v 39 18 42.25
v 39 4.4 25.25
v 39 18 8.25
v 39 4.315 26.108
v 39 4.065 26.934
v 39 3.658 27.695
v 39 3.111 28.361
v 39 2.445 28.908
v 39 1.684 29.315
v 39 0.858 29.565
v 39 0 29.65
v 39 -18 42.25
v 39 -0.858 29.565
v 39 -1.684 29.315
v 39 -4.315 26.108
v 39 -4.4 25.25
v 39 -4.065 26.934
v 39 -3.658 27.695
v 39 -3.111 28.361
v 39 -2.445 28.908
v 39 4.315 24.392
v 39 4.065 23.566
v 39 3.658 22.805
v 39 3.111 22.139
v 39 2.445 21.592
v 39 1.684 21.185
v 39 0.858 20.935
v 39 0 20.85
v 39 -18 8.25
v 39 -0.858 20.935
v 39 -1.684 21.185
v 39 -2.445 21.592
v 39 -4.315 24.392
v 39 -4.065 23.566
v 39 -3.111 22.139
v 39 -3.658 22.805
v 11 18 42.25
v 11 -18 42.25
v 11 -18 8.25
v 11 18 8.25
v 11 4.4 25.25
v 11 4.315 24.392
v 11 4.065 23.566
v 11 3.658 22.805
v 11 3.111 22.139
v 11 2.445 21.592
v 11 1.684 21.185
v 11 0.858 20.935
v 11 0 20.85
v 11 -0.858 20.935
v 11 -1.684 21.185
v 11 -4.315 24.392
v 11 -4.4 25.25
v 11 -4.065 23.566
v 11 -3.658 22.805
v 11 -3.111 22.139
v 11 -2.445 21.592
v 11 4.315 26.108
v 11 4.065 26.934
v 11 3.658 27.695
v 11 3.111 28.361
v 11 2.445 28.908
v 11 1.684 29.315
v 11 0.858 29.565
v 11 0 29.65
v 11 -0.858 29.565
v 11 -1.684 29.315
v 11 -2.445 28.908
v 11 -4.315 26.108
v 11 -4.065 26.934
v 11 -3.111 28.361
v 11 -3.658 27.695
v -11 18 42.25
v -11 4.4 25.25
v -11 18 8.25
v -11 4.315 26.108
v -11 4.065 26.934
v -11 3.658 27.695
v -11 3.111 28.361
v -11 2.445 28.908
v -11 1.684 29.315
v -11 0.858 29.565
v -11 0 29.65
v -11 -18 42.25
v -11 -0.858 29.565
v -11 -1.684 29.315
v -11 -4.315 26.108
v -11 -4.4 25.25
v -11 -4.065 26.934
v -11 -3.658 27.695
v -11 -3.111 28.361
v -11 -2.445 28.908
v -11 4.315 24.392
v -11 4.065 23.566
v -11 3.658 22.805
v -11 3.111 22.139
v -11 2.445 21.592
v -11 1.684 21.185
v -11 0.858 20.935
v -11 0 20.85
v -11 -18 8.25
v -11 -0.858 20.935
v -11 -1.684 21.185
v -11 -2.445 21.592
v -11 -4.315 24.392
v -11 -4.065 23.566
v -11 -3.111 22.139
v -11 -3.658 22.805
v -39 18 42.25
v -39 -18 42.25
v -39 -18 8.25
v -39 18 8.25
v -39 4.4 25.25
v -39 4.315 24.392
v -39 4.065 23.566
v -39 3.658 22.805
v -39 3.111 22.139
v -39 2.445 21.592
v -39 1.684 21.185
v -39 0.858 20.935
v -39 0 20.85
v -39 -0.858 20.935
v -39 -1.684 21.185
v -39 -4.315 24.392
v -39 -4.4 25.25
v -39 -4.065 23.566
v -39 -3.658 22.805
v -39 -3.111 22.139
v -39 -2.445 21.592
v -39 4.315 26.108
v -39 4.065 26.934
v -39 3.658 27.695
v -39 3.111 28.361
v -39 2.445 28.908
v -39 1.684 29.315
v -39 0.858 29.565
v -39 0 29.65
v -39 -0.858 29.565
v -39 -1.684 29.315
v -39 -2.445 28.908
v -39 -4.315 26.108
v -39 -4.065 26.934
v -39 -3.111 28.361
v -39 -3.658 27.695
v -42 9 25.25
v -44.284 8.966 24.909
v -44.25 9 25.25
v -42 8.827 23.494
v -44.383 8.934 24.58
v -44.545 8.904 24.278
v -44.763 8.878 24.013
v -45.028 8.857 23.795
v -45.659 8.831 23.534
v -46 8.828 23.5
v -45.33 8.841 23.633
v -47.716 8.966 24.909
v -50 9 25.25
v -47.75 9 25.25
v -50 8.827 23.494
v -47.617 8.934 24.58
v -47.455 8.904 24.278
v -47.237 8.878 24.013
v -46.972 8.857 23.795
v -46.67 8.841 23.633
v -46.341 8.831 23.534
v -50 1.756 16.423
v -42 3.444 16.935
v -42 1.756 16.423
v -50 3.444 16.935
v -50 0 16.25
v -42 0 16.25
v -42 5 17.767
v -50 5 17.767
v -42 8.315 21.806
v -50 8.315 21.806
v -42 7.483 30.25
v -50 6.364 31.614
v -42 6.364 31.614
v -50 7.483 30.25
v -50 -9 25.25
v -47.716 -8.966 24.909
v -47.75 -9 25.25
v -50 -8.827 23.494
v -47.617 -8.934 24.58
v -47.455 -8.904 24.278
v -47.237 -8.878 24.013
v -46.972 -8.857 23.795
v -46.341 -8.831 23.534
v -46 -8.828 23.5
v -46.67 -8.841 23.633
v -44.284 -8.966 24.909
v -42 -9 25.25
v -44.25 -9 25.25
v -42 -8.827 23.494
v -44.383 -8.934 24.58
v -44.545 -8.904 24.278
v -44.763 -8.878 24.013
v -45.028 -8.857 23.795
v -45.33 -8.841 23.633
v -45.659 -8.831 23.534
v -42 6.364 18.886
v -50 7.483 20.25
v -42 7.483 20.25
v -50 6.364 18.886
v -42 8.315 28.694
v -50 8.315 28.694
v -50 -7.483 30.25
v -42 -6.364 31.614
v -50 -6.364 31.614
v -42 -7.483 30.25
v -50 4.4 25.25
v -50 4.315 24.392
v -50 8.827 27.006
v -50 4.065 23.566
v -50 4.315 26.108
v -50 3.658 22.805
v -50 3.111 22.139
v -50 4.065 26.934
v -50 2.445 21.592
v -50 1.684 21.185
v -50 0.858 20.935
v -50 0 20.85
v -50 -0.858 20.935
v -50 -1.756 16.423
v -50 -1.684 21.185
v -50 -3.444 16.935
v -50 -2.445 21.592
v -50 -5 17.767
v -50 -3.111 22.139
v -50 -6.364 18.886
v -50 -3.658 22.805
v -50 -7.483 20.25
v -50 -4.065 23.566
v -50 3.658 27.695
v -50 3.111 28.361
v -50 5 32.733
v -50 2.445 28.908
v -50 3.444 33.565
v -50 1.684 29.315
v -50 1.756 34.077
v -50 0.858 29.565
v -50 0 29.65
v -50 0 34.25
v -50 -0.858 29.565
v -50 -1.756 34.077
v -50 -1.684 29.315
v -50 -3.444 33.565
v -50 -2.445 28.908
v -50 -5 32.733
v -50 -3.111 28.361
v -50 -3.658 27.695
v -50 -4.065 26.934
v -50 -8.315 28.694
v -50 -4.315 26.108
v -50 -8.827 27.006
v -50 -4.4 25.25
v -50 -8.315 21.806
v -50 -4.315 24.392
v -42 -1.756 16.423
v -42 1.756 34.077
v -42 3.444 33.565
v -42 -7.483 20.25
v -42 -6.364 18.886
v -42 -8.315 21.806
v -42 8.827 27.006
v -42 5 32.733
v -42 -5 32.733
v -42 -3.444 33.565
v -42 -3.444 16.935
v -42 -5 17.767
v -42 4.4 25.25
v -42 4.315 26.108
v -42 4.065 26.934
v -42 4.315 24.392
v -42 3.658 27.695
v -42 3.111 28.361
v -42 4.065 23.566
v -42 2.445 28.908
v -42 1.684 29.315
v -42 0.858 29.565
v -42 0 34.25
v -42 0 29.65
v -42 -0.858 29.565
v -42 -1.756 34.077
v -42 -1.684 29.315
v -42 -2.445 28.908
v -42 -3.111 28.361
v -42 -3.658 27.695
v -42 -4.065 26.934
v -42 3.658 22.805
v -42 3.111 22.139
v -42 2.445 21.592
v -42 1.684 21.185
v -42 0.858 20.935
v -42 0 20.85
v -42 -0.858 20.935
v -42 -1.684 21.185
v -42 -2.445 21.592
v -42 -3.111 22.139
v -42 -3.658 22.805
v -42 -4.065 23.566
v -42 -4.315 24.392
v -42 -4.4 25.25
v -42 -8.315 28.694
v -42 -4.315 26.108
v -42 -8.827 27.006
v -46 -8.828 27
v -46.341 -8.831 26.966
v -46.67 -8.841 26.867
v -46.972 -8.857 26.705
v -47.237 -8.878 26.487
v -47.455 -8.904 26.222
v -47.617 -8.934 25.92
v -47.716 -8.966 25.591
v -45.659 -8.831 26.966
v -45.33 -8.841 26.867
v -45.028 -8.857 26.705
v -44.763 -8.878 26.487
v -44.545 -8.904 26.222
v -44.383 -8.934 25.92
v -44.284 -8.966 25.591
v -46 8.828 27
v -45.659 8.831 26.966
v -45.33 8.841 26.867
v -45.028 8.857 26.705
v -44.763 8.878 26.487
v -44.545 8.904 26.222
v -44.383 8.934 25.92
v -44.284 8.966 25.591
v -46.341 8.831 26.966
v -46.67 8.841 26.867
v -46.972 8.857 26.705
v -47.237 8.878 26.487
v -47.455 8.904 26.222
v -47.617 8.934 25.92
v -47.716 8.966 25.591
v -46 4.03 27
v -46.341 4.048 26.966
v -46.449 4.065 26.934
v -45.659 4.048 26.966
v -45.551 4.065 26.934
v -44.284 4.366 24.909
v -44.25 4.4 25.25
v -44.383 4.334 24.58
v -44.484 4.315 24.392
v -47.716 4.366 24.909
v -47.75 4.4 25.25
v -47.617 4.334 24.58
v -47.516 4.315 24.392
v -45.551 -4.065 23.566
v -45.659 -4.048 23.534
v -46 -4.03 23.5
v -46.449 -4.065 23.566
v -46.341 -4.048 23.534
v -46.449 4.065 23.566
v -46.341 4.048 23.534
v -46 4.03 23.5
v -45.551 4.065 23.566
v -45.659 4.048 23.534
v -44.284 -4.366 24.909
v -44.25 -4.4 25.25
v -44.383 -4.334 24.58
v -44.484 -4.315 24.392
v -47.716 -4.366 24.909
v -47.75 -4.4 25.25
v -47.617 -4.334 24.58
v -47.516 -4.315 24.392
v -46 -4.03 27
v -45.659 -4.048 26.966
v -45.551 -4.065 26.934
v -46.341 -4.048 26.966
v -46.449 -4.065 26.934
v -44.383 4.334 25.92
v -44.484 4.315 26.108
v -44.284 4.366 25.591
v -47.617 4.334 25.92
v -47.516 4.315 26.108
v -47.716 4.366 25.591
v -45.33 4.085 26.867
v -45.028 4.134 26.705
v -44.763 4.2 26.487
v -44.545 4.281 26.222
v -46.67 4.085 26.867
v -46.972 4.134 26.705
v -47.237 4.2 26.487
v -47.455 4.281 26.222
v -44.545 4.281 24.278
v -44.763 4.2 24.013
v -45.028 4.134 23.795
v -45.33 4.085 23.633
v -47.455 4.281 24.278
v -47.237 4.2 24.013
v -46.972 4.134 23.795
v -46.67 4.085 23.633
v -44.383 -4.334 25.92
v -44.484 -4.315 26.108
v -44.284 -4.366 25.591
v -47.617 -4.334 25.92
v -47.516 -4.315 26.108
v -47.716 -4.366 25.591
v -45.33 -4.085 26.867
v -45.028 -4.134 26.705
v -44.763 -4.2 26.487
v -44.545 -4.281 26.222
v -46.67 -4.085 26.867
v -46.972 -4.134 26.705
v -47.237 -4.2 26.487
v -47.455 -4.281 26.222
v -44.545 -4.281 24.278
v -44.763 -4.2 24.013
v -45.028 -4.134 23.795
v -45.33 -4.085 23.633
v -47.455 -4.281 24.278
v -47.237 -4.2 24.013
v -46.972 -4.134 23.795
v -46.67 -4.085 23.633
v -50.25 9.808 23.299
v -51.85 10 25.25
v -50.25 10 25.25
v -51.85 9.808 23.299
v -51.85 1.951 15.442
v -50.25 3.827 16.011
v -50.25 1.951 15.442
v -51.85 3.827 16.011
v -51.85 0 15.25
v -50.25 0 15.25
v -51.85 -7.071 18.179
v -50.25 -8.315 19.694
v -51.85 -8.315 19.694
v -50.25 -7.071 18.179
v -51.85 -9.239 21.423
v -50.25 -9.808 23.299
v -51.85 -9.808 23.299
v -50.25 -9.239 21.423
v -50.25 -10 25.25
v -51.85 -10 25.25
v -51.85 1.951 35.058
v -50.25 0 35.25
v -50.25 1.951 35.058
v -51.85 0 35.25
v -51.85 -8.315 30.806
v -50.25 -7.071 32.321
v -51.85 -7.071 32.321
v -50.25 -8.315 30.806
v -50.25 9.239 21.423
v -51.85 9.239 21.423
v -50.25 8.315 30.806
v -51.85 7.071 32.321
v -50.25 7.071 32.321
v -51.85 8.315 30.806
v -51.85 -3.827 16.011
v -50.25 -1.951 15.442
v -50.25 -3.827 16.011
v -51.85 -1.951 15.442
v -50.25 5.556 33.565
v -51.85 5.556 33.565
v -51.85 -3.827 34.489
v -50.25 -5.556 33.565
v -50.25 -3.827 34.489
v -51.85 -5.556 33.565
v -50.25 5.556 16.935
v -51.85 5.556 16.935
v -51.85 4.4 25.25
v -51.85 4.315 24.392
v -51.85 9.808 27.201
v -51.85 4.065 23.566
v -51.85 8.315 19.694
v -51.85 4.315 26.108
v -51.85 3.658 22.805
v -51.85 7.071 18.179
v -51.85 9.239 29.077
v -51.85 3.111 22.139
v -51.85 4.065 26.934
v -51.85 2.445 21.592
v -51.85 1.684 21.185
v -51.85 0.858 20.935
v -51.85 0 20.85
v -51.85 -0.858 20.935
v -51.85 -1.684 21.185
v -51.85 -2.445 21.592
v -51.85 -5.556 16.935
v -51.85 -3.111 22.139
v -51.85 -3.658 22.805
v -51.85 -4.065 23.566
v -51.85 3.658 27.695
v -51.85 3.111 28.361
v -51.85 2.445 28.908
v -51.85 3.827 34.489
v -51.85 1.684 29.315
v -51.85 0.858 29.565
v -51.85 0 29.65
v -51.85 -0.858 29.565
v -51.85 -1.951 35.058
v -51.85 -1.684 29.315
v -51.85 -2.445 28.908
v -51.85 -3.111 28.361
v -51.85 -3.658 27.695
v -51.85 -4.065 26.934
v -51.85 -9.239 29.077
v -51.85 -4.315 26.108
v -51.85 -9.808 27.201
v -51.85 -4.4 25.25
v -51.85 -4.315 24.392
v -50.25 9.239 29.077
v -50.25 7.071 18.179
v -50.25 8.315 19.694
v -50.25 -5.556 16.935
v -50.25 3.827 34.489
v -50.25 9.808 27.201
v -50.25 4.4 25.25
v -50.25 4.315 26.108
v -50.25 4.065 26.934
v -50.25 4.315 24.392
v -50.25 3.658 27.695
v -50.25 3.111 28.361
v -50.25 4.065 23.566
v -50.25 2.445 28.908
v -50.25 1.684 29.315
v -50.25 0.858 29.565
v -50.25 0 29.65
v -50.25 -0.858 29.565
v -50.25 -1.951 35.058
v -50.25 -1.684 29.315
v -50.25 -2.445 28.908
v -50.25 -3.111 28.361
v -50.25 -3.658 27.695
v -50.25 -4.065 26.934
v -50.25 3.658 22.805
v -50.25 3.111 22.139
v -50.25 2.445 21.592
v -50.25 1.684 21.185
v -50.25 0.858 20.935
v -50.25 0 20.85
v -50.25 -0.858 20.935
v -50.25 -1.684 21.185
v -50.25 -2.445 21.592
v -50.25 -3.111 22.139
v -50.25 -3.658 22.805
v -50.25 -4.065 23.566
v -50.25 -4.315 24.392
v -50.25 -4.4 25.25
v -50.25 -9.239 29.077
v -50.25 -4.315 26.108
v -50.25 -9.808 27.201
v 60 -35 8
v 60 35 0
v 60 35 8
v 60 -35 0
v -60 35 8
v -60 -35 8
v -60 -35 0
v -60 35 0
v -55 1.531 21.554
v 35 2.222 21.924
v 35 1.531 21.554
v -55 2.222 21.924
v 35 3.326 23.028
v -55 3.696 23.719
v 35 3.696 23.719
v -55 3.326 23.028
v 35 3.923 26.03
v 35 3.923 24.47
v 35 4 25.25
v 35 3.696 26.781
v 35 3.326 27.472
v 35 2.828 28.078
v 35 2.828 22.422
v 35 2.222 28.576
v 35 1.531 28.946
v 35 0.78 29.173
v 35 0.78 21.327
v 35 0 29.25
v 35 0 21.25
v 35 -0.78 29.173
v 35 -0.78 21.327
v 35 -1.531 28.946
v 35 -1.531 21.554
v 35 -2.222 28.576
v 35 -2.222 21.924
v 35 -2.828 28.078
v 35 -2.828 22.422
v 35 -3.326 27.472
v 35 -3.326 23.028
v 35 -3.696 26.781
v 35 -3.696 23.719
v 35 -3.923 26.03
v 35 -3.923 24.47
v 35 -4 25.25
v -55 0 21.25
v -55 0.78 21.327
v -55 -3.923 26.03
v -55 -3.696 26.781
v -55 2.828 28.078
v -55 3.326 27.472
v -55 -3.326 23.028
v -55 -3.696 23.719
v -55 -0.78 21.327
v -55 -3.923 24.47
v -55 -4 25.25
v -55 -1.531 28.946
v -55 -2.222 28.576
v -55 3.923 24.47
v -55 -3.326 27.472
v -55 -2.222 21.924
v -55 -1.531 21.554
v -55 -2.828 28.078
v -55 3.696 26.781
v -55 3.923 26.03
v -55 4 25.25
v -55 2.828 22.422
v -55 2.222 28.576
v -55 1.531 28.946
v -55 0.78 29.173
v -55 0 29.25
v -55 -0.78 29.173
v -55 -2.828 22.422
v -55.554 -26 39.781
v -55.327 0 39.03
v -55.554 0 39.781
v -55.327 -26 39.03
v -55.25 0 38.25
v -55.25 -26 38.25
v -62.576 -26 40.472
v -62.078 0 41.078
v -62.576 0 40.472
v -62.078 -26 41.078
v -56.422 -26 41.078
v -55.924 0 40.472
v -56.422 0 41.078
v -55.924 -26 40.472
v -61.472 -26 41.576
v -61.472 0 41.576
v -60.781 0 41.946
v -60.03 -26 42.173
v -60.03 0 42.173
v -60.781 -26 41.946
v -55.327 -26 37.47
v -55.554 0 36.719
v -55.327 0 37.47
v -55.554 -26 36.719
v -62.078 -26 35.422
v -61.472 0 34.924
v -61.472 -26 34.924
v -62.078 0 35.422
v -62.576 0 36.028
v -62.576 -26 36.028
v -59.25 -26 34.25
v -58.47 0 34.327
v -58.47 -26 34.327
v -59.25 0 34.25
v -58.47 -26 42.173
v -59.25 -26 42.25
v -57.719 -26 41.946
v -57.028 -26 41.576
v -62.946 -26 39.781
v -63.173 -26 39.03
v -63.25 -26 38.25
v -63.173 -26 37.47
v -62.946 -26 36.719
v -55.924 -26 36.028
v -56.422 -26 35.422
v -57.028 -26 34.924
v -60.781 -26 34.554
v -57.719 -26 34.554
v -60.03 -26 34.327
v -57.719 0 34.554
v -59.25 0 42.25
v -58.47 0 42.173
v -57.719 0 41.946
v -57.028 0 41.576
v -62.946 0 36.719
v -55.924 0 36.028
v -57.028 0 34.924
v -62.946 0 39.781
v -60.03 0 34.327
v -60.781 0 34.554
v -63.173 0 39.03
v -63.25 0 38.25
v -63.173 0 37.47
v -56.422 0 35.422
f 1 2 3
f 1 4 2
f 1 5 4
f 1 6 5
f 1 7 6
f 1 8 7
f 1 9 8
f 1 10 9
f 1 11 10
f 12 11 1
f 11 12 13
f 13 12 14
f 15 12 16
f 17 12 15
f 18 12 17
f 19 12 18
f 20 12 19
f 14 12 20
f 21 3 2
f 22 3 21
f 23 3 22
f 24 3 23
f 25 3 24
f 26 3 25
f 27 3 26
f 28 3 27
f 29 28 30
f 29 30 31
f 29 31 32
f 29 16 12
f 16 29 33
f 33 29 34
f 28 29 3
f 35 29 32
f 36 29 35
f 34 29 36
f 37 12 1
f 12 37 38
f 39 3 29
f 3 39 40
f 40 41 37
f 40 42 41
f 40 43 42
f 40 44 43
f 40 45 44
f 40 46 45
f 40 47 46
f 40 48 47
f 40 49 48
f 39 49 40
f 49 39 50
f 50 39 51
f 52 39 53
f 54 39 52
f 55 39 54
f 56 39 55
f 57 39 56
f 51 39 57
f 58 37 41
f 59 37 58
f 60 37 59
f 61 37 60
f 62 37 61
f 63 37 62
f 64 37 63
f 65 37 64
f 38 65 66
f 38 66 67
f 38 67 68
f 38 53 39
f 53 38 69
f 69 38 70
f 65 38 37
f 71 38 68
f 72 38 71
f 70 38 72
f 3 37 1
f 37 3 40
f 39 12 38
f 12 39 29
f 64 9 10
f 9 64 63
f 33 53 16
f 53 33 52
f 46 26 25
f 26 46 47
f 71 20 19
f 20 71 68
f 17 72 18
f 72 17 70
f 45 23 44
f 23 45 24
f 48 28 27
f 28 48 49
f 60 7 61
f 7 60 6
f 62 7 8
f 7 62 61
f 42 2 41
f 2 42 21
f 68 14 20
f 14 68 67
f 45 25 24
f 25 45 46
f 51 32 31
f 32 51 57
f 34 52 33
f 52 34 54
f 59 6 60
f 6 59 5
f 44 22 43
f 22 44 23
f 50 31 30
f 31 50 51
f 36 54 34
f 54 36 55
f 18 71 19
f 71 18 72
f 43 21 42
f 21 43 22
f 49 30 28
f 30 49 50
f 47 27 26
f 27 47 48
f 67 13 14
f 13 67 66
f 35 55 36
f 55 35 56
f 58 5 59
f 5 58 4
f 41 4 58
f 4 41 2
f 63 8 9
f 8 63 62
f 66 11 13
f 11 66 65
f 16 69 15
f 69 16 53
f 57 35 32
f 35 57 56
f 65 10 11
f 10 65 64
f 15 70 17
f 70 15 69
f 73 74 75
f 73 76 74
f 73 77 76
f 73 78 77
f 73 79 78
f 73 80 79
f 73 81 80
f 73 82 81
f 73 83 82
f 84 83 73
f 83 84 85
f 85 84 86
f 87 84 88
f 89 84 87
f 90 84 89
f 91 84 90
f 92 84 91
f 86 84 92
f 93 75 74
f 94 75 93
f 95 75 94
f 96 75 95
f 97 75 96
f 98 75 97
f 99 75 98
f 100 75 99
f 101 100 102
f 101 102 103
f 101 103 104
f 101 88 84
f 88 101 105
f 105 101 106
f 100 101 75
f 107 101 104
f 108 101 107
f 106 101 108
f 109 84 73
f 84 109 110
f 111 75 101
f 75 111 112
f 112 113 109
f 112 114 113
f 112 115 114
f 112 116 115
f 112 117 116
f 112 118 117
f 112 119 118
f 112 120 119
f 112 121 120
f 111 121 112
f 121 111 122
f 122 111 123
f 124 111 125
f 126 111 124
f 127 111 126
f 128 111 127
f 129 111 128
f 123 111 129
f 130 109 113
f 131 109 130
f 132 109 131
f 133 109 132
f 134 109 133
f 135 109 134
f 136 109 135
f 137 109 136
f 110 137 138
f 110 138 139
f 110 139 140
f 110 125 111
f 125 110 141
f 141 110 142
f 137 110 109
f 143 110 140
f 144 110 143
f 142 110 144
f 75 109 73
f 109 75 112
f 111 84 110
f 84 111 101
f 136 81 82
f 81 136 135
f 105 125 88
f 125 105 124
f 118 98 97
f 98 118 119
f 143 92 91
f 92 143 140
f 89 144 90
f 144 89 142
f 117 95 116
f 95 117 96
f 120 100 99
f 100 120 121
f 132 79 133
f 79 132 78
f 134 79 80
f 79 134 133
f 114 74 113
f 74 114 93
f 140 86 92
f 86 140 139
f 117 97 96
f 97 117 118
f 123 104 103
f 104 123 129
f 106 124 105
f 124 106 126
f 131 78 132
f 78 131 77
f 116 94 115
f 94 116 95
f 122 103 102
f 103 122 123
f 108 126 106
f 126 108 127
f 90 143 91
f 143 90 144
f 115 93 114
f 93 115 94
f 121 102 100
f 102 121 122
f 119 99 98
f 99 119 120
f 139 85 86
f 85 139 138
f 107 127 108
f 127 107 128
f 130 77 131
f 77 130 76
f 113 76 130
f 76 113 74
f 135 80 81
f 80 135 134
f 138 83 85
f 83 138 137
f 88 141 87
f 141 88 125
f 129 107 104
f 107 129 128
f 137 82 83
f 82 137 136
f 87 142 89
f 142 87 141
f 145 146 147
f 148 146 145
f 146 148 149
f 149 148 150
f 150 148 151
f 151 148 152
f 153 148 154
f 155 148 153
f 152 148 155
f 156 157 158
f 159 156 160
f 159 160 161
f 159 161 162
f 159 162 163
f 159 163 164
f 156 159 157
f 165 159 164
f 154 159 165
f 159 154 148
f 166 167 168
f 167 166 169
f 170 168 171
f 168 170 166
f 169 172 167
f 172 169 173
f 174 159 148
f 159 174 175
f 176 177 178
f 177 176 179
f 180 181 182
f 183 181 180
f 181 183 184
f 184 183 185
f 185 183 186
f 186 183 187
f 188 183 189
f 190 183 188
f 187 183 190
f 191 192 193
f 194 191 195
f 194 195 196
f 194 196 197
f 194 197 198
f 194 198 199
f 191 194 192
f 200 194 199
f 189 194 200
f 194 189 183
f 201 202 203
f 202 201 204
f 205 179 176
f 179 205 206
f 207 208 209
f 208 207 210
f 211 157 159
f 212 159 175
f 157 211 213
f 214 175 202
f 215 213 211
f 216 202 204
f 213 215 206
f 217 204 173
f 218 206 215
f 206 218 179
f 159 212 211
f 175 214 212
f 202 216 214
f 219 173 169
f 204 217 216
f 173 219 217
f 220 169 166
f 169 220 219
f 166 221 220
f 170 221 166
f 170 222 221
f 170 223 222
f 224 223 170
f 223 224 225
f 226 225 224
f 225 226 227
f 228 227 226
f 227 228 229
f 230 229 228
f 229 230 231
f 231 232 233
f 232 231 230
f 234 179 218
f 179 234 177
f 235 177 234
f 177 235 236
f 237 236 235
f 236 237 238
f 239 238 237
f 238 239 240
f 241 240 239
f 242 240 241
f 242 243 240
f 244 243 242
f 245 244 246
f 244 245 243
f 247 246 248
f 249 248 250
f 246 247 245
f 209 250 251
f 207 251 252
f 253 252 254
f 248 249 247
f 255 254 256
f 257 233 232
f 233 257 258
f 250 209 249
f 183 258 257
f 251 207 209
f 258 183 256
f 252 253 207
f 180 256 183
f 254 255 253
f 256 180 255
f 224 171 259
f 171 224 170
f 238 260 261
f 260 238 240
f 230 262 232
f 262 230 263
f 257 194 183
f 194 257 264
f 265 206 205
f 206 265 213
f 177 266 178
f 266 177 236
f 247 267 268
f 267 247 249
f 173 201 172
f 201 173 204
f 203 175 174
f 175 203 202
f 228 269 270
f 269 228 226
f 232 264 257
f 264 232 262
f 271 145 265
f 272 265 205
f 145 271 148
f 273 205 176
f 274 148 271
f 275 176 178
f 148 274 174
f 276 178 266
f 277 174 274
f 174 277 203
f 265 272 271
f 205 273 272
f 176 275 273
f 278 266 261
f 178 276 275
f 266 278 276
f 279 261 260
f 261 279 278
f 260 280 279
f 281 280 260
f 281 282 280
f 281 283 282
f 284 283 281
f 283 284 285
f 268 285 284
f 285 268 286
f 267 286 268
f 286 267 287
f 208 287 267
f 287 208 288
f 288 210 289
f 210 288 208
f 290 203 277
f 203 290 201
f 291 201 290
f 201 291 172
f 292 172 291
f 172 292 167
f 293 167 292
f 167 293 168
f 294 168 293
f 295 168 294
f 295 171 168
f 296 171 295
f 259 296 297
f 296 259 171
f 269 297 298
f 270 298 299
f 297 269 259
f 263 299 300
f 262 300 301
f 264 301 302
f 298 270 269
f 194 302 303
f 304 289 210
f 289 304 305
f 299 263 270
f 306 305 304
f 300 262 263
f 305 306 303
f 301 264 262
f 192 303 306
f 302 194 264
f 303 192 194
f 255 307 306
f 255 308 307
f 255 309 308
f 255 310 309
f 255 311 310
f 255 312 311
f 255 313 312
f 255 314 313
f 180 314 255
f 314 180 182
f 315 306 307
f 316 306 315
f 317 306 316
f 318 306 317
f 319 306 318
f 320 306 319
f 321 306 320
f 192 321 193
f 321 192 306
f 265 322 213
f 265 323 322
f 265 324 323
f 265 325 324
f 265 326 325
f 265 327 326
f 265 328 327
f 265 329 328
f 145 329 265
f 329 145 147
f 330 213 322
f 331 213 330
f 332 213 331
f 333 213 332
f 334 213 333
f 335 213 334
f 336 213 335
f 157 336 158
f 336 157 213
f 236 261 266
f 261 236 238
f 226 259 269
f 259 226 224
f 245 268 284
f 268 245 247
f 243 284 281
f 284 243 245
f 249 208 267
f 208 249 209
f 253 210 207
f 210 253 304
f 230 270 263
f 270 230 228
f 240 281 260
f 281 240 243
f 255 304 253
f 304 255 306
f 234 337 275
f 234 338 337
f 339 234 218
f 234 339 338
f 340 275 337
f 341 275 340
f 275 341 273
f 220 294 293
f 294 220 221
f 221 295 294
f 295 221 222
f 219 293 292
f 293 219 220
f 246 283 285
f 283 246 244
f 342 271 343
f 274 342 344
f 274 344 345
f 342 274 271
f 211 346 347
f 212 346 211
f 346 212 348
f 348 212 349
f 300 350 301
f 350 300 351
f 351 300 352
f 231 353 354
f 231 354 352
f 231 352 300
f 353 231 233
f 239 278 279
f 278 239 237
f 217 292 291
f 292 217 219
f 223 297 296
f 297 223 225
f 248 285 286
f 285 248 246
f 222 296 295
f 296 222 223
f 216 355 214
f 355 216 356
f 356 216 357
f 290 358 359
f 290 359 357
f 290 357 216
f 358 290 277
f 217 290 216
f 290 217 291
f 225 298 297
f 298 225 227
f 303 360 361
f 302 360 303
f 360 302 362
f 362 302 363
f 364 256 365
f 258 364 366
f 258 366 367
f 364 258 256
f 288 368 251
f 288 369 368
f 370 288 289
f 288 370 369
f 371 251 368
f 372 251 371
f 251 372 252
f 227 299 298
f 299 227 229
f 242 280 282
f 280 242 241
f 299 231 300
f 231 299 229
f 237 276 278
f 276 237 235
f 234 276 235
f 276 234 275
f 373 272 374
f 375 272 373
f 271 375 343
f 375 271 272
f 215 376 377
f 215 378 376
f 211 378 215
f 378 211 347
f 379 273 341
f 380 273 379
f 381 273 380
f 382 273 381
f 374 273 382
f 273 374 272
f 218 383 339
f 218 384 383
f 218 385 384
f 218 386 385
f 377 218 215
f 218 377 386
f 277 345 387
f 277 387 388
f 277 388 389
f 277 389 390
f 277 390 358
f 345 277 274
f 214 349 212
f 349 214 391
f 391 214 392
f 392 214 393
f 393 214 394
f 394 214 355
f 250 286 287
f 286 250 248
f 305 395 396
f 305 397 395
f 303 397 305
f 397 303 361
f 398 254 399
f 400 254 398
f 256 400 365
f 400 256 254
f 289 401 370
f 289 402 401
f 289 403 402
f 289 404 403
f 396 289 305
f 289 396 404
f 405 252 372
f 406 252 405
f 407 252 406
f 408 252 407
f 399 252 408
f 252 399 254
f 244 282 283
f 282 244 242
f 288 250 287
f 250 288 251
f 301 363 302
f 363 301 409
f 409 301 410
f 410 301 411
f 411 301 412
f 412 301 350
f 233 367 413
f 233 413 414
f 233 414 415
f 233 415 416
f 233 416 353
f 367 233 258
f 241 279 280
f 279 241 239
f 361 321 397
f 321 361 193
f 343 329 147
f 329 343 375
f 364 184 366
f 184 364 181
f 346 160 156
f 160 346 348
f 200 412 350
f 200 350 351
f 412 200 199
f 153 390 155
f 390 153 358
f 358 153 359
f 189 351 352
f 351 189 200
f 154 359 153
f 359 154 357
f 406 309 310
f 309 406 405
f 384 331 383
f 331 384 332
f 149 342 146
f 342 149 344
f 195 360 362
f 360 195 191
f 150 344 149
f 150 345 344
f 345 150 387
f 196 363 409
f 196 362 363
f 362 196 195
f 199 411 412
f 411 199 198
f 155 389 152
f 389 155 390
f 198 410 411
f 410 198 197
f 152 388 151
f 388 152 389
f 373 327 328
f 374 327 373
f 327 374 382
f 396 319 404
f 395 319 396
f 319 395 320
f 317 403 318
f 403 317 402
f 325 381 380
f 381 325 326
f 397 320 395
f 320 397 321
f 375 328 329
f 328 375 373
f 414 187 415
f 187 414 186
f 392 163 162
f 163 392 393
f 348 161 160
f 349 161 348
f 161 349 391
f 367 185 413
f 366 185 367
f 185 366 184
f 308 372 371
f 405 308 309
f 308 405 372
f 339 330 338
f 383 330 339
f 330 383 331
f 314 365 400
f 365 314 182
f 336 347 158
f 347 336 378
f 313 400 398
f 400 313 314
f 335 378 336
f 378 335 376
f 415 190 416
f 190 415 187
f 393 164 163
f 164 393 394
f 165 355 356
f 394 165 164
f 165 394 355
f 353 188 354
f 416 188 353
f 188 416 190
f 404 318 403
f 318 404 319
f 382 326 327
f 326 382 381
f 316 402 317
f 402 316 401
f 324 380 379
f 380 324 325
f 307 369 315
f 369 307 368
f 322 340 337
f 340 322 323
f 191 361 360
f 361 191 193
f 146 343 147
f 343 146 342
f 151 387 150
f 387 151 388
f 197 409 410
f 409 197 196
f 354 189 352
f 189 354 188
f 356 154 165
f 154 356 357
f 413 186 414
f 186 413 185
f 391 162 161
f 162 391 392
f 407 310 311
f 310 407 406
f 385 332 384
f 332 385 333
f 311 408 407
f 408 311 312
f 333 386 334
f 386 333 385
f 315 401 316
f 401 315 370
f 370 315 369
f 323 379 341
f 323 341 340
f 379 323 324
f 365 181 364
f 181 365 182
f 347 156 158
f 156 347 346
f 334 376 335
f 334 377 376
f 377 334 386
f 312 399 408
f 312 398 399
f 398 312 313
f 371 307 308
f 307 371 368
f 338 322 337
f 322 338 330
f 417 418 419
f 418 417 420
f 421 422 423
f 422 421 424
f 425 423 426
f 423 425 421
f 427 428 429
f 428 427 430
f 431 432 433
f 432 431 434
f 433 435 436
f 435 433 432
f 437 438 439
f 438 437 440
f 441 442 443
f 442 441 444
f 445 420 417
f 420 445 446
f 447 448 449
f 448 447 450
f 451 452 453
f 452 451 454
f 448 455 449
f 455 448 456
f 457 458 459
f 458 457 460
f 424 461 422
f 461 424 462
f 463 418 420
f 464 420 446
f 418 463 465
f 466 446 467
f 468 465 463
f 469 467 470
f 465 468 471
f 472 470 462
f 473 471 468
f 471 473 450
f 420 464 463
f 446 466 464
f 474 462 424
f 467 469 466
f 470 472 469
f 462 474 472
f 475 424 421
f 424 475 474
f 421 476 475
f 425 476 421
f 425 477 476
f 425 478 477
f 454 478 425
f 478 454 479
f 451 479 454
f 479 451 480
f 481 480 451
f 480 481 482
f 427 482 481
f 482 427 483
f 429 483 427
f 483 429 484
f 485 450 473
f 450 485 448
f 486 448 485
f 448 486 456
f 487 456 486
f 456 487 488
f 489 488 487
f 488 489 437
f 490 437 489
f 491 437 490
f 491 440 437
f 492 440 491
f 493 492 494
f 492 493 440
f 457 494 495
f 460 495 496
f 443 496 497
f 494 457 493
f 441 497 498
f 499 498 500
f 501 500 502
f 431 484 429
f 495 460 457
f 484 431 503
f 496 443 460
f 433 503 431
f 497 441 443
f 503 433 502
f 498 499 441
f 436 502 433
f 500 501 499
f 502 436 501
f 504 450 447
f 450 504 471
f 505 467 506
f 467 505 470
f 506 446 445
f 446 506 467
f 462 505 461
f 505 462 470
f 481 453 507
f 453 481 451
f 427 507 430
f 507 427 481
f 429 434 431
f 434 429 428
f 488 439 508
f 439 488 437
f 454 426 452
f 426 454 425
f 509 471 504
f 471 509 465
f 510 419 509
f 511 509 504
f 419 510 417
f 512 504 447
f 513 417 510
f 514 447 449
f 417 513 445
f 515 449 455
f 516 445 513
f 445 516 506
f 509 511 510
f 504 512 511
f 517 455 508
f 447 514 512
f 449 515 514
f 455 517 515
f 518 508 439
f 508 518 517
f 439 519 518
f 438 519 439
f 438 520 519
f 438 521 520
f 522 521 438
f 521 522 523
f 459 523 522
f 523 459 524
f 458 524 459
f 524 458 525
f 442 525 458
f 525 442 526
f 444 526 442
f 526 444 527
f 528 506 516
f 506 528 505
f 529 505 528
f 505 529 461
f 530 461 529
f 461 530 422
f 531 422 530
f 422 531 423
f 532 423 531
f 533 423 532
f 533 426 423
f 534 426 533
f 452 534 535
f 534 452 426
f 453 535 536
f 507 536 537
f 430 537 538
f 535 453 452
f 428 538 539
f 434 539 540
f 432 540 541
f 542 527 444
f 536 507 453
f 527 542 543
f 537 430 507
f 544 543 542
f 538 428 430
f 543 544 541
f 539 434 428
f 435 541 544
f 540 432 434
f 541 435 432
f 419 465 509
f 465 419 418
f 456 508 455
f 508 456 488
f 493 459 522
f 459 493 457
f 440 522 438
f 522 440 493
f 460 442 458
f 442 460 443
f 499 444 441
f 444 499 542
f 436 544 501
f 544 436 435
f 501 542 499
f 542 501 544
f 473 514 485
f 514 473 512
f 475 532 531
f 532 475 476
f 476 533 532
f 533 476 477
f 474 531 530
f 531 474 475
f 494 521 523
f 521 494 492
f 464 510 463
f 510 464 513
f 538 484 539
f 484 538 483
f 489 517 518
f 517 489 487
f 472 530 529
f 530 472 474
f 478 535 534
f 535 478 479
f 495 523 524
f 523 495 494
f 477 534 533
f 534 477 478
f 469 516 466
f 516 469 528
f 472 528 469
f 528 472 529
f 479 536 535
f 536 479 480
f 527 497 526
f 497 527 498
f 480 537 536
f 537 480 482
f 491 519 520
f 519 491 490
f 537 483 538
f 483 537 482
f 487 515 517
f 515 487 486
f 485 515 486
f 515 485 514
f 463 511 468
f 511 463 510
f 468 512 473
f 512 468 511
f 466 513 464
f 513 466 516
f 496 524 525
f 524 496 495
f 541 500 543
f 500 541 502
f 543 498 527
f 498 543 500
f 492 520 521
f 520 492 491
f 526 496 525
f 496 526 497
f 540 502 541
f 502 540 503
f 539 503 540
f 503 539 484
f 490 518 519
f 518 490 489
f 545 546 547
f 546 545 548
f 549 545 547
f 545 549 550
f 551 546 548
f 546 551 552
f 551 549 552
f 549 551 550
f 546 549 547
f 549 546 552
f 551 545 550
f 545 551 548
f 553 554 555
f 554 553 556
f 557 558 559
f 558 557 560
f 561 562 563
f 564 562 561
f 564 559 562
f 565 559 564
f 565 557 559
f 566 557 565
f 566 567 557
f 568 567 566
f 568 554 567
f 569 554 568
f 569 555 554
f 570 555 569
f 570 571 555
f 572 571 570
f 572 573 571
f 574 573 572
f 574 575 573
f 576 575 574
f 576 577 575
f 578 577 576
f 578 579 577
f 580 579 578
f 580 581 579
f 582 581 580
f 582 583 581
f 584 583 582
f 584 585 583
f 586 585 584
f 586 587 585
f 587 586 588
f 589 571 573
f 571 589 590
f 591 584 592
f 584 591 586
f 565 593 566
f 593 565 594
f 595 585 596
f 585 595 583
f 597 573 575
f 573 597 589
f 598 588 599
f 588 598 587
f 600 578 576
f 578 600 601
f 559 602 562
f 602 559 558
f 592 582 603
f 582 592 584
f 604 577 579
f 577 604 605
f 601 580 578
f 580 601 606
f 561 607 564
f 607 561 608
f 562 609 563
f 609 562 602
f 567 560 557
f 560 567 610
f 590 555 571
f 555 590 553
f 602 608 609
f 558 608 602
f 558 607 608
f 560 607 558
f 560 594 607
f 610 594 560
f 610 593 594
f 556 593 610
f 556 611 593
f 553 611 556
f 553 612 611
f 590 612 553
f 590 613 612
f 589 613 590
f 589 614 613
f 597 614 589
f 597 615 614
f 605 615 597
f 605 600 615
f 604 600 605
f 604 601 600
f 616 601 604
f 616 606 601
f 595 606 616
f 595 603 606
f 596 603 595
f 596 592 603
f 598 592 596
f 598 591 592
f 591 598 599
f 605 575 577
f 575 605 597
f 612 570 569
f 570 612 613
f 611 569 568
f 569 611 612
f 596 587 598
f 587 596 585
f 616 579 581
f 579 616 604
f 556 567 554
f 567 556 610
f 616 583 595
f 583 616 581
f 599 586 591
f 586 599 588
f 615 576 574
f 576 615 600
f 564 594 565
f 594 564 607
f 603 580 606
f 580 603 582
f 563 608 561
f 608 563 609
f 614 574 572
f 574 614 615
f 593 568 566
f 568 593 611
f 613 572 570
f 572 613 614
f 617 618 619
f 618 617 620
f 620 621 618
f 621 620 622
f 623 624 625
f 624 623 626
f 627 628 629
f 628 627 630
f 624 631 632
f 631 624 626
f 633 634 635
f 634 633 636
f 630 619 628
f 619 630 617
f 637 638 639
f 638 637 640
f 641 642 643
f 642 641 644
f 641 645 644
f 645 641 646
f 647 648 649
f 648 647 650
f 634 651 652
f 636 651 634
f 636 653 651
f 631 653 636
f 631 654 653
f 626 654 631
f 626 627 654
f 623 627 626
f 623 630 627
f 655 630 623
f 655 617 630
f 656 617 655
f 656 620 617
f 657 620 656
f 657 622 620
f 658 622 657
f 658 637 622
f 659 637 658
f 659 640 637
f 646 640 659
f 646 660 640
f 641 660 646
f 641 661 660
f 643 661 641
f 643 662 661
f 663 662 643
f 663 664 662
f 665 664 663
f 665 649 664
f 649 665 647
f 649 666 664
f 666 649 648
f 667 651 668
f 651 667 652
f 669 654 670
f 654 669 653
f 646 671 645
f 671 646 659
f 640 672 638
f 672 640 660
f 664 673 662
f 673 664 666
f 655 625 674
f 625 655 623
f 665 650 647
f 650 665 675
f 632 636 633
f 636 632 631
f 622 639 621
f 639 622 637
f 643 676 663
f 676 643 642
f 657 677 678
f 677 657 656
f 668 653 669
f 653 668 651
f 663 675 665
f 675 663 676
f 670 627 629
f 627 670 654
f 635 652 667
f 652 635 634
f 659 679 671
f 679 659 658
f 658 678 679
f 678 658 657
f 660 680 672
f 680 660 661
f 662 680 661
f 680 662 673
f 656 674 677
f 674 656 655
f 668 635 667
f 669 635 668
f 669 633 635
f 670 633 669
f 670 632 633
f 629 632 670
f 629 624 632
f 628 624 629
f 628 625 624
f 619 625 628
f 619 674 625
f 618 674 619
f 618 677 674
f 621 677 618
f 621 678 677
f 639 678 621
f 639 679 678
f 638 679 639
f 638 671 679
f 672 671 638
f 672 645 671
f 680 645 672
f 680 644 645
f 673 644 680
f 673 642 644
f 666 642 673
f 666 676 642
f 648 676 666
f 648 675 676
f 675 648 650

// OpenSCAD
$fn = 32;

// ------------------------------------------------------------------------
// Machine vise: screw d8, jaws 28 x 34 mm
// Every part is its own module, assembly() places every instance.
// ------------------------------------------------------------------------

// --- part 1 ---
module vise_bed() {
  difference() {
    translate([-60, -35, 0]) cube([120, 70, 8]);
  }
}

// --- part 2 ---
module vise_jaw() {
  difference() {
    translate([-14, -18, 0]) cube([28, 36, 34]);
    translate([0, 0, 17]) rotate([0, 90, 0]) cylinder(h = 30, d = 8.8, center = true);
  }
}

// --- part 3 ---
module vise_screw() {
  translate([0, 0, -45]) cylinder(h = 90, d = 8);
}

// --- part 4 ---
module screw_collar() {
  difference() {
    cylinder(h = 8, d = 18);
    translate([0, 0, -1]) cylinder(h = 10, d = 8.8);
    translate([0, 0, 4]) rotate([90, 0, 0]) cylinder(h = 20, d = 3.5, center = true);
  }
}

// --- part 5 ---
module screw_washer() {
  difference() {
      translate([0, 0, 0]) cylinder(h = 1.6, d = 20);
      translate([0, 0, -1]) cylinder(h = 3.6, d = 8.8);
    }
}

// --- part 6 ---
module vise_handle() {
  cylinder(h = 26, d = 8);
}

// --- assembly ---
module assembly() {
  color([0.80, 0.24, 0.20]) translate([0, 0, 0]) rotate([0, 0, 0]) vise_bed();
  color([0.20, 0.45, 0.75]) translate([25, 0, 8.25]) rotate([0, 0, 0]) vise_jaw();
  color([0.25, 0.62, 0.32]) translate([-25, 0, 8.25]) rotate([0, 0, 0]) vise_jaw();
  color([0.92, 0.70, 0.18]) translate([-10, 0, 25.25]) rotate([0, 90, 0]) vise_screw();
  color([0.58, 0.35, 0.70]) translate([-50, 0, 25.25]) rotate([0, 90, 0]) screw_collar();
  color([0.16, 0.66, 0.66]) translate([-51.85, 0, 25.25]) rotate([0, 90, 0]) screw_washer();
  color([0.85, 0.48, 0.18]) translate([-59.25, 0, 38.25]) rotate([90, 0, 0]) vise_handle();
}

assembly();
